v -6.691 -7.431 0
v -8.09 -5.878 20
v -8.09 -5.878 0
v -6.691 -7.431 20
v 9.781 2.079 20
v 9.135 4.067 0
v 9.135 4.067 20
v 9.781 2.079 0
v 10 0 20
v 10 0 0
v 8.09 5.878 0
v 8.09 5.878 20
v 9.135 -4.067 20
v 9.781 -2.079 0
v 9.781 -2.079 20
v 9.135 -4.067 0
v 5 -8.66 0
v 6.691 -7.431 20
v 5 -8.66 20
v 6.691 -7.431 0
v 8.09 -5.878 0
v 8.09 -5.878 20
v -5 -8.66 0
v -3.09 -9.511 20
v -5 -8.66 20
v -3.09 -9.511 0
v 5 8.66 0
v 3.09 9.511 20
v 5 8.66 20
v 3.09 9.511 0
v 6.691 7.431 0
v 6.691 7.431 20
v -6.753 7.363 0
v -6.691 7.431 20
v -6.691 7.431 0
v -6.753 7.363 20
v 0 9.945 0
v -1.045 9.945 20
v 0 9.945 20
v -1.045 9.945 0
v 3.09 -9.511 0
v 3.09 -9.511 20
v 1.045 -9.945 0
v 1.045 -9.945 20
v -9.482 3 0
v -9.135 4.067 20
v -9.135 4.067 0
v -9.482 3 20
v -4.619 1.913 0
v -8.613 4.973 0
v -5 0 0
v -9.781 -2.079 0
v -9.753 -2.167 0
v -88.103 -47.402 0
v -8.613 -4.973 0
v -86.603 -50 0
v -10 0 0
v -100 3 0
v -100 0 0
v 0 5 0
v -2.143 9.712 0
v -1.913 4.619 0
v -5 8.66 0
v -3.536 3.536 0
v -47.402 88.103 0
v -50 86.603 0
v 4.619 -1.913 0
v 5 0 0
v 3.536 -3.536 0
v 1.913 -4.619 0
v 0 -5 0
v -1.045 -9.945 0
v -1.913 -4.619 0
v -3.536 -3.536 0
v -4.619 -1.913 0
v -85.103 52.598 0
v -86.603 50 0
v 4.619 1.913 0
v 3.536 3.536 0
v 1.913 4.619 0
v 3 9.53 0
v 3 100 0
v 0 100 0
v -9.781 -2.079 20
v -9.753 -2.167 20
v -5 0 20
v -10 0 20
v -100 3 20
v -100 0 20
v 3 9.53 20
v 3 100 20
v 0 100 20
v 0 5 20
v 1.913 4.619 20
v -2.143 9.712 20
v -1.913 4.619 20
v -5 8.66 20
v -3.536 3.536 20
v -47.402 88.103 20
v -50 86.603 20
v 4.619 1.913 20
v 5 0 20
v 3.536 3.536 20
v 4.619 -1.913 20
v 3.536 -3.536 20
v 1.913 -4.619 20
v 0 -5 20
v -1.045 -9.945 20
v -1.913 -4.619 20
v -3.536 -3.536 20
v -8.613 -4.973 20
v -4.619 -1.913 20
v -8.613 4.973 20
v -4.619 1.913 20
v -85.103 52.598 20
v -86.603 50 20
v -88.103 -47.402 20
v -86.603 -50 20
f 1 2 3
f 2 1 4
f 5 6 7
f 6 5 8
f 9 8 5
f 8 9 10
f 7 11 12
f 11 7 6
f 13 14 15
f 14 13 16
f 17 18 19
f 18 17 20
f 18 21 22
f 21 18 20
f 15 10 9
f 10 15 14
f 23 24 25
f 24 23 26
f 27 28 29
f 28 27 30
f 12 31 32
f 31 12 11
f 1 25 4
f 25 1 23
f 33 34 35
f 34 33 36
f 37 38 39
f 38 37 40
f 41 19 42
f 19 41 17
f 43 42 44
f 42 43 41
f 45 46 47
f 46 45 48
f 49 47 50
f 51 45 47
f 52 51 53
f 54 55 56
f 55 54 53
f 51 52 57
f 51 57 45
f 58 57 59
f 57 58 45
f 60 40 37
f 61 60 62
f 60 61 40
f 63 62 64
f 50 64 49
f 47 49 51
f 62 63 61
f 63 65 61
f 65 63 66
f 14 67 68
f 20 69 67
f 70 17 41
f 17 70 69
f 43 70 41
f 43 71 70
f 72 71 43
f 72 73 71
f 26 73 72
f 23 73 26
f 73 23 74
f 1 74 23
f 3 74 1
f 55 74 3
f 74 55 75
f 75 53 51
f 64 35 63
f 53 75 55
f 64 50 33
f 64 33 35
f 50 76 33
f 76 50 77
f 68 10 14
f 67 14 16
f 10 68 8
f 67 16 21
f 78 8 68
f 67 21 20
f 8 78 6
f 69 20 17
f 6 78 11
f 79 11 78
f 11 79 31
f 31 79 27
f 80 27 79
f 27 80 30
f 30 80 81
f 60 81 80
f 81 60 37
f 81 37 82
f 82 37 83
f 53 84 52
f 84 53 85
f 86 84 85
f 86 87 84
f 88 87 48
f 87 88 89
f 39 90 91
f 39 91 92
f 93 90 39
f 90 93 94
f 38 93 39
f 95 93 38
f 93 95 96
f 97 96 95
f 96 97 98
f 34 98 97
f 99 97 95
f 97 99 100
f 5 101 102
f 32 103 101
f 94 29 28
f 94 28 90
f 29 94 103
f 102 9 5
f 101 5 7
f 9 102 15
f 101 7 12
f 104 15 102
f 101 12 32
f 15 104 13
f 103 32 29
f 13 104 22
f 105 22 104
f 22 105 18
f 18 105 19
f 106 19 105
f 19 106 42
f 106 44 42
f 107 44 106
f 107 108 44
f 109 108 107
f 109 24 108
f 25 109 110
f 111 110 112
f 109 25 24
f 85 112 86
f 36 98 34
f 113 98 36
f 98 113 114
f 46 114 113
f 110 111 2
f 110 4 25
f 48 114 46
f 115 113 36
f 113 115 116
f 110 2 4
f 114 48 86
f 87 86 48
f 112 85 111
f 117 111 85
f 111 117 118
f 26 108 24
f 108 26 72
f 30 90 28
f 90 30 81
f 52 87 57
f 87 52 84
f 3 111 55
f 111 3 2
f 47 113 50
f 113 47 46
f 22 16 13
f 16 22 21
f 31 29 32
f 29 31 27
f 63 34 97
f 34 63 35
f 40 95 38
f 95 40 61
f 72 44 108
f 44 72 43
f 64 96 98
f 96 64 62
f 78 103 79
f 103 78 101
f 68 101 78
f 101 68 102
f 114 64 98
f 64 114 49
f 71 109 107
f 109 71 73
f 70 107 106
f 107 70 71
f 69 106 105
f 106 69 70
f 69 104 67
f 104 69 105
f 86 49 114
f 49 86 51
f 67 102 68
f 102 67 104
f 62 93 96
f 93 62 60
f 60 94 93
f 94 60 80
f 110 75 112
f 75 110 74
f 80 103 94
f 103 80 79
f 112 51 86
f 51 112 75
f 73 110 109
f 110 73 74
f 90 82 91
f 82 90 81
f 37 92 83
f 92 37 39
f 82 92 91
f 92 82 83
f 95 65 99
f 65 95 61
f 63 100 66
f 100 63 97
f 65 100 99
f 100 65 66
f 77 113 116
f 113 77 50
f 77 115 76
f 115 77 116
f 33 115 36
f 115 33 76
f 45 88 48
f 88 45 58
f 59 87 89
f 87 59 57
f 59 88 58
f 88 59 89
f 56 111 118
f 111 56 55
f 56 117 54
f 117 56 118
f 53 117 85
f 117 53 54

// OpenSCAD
module pales() {
	for (i = [0: 1: 4]){
		rotate([0, 0, i*30]) cube([3, 100, 20]);
	}
}

module vis() {
	difference(){
		cylinder(20, r=10);
		cylinder(20, r=5);
	}
}

vis();
difference() {
	pales();
	cylinder(20, r=5);
}
